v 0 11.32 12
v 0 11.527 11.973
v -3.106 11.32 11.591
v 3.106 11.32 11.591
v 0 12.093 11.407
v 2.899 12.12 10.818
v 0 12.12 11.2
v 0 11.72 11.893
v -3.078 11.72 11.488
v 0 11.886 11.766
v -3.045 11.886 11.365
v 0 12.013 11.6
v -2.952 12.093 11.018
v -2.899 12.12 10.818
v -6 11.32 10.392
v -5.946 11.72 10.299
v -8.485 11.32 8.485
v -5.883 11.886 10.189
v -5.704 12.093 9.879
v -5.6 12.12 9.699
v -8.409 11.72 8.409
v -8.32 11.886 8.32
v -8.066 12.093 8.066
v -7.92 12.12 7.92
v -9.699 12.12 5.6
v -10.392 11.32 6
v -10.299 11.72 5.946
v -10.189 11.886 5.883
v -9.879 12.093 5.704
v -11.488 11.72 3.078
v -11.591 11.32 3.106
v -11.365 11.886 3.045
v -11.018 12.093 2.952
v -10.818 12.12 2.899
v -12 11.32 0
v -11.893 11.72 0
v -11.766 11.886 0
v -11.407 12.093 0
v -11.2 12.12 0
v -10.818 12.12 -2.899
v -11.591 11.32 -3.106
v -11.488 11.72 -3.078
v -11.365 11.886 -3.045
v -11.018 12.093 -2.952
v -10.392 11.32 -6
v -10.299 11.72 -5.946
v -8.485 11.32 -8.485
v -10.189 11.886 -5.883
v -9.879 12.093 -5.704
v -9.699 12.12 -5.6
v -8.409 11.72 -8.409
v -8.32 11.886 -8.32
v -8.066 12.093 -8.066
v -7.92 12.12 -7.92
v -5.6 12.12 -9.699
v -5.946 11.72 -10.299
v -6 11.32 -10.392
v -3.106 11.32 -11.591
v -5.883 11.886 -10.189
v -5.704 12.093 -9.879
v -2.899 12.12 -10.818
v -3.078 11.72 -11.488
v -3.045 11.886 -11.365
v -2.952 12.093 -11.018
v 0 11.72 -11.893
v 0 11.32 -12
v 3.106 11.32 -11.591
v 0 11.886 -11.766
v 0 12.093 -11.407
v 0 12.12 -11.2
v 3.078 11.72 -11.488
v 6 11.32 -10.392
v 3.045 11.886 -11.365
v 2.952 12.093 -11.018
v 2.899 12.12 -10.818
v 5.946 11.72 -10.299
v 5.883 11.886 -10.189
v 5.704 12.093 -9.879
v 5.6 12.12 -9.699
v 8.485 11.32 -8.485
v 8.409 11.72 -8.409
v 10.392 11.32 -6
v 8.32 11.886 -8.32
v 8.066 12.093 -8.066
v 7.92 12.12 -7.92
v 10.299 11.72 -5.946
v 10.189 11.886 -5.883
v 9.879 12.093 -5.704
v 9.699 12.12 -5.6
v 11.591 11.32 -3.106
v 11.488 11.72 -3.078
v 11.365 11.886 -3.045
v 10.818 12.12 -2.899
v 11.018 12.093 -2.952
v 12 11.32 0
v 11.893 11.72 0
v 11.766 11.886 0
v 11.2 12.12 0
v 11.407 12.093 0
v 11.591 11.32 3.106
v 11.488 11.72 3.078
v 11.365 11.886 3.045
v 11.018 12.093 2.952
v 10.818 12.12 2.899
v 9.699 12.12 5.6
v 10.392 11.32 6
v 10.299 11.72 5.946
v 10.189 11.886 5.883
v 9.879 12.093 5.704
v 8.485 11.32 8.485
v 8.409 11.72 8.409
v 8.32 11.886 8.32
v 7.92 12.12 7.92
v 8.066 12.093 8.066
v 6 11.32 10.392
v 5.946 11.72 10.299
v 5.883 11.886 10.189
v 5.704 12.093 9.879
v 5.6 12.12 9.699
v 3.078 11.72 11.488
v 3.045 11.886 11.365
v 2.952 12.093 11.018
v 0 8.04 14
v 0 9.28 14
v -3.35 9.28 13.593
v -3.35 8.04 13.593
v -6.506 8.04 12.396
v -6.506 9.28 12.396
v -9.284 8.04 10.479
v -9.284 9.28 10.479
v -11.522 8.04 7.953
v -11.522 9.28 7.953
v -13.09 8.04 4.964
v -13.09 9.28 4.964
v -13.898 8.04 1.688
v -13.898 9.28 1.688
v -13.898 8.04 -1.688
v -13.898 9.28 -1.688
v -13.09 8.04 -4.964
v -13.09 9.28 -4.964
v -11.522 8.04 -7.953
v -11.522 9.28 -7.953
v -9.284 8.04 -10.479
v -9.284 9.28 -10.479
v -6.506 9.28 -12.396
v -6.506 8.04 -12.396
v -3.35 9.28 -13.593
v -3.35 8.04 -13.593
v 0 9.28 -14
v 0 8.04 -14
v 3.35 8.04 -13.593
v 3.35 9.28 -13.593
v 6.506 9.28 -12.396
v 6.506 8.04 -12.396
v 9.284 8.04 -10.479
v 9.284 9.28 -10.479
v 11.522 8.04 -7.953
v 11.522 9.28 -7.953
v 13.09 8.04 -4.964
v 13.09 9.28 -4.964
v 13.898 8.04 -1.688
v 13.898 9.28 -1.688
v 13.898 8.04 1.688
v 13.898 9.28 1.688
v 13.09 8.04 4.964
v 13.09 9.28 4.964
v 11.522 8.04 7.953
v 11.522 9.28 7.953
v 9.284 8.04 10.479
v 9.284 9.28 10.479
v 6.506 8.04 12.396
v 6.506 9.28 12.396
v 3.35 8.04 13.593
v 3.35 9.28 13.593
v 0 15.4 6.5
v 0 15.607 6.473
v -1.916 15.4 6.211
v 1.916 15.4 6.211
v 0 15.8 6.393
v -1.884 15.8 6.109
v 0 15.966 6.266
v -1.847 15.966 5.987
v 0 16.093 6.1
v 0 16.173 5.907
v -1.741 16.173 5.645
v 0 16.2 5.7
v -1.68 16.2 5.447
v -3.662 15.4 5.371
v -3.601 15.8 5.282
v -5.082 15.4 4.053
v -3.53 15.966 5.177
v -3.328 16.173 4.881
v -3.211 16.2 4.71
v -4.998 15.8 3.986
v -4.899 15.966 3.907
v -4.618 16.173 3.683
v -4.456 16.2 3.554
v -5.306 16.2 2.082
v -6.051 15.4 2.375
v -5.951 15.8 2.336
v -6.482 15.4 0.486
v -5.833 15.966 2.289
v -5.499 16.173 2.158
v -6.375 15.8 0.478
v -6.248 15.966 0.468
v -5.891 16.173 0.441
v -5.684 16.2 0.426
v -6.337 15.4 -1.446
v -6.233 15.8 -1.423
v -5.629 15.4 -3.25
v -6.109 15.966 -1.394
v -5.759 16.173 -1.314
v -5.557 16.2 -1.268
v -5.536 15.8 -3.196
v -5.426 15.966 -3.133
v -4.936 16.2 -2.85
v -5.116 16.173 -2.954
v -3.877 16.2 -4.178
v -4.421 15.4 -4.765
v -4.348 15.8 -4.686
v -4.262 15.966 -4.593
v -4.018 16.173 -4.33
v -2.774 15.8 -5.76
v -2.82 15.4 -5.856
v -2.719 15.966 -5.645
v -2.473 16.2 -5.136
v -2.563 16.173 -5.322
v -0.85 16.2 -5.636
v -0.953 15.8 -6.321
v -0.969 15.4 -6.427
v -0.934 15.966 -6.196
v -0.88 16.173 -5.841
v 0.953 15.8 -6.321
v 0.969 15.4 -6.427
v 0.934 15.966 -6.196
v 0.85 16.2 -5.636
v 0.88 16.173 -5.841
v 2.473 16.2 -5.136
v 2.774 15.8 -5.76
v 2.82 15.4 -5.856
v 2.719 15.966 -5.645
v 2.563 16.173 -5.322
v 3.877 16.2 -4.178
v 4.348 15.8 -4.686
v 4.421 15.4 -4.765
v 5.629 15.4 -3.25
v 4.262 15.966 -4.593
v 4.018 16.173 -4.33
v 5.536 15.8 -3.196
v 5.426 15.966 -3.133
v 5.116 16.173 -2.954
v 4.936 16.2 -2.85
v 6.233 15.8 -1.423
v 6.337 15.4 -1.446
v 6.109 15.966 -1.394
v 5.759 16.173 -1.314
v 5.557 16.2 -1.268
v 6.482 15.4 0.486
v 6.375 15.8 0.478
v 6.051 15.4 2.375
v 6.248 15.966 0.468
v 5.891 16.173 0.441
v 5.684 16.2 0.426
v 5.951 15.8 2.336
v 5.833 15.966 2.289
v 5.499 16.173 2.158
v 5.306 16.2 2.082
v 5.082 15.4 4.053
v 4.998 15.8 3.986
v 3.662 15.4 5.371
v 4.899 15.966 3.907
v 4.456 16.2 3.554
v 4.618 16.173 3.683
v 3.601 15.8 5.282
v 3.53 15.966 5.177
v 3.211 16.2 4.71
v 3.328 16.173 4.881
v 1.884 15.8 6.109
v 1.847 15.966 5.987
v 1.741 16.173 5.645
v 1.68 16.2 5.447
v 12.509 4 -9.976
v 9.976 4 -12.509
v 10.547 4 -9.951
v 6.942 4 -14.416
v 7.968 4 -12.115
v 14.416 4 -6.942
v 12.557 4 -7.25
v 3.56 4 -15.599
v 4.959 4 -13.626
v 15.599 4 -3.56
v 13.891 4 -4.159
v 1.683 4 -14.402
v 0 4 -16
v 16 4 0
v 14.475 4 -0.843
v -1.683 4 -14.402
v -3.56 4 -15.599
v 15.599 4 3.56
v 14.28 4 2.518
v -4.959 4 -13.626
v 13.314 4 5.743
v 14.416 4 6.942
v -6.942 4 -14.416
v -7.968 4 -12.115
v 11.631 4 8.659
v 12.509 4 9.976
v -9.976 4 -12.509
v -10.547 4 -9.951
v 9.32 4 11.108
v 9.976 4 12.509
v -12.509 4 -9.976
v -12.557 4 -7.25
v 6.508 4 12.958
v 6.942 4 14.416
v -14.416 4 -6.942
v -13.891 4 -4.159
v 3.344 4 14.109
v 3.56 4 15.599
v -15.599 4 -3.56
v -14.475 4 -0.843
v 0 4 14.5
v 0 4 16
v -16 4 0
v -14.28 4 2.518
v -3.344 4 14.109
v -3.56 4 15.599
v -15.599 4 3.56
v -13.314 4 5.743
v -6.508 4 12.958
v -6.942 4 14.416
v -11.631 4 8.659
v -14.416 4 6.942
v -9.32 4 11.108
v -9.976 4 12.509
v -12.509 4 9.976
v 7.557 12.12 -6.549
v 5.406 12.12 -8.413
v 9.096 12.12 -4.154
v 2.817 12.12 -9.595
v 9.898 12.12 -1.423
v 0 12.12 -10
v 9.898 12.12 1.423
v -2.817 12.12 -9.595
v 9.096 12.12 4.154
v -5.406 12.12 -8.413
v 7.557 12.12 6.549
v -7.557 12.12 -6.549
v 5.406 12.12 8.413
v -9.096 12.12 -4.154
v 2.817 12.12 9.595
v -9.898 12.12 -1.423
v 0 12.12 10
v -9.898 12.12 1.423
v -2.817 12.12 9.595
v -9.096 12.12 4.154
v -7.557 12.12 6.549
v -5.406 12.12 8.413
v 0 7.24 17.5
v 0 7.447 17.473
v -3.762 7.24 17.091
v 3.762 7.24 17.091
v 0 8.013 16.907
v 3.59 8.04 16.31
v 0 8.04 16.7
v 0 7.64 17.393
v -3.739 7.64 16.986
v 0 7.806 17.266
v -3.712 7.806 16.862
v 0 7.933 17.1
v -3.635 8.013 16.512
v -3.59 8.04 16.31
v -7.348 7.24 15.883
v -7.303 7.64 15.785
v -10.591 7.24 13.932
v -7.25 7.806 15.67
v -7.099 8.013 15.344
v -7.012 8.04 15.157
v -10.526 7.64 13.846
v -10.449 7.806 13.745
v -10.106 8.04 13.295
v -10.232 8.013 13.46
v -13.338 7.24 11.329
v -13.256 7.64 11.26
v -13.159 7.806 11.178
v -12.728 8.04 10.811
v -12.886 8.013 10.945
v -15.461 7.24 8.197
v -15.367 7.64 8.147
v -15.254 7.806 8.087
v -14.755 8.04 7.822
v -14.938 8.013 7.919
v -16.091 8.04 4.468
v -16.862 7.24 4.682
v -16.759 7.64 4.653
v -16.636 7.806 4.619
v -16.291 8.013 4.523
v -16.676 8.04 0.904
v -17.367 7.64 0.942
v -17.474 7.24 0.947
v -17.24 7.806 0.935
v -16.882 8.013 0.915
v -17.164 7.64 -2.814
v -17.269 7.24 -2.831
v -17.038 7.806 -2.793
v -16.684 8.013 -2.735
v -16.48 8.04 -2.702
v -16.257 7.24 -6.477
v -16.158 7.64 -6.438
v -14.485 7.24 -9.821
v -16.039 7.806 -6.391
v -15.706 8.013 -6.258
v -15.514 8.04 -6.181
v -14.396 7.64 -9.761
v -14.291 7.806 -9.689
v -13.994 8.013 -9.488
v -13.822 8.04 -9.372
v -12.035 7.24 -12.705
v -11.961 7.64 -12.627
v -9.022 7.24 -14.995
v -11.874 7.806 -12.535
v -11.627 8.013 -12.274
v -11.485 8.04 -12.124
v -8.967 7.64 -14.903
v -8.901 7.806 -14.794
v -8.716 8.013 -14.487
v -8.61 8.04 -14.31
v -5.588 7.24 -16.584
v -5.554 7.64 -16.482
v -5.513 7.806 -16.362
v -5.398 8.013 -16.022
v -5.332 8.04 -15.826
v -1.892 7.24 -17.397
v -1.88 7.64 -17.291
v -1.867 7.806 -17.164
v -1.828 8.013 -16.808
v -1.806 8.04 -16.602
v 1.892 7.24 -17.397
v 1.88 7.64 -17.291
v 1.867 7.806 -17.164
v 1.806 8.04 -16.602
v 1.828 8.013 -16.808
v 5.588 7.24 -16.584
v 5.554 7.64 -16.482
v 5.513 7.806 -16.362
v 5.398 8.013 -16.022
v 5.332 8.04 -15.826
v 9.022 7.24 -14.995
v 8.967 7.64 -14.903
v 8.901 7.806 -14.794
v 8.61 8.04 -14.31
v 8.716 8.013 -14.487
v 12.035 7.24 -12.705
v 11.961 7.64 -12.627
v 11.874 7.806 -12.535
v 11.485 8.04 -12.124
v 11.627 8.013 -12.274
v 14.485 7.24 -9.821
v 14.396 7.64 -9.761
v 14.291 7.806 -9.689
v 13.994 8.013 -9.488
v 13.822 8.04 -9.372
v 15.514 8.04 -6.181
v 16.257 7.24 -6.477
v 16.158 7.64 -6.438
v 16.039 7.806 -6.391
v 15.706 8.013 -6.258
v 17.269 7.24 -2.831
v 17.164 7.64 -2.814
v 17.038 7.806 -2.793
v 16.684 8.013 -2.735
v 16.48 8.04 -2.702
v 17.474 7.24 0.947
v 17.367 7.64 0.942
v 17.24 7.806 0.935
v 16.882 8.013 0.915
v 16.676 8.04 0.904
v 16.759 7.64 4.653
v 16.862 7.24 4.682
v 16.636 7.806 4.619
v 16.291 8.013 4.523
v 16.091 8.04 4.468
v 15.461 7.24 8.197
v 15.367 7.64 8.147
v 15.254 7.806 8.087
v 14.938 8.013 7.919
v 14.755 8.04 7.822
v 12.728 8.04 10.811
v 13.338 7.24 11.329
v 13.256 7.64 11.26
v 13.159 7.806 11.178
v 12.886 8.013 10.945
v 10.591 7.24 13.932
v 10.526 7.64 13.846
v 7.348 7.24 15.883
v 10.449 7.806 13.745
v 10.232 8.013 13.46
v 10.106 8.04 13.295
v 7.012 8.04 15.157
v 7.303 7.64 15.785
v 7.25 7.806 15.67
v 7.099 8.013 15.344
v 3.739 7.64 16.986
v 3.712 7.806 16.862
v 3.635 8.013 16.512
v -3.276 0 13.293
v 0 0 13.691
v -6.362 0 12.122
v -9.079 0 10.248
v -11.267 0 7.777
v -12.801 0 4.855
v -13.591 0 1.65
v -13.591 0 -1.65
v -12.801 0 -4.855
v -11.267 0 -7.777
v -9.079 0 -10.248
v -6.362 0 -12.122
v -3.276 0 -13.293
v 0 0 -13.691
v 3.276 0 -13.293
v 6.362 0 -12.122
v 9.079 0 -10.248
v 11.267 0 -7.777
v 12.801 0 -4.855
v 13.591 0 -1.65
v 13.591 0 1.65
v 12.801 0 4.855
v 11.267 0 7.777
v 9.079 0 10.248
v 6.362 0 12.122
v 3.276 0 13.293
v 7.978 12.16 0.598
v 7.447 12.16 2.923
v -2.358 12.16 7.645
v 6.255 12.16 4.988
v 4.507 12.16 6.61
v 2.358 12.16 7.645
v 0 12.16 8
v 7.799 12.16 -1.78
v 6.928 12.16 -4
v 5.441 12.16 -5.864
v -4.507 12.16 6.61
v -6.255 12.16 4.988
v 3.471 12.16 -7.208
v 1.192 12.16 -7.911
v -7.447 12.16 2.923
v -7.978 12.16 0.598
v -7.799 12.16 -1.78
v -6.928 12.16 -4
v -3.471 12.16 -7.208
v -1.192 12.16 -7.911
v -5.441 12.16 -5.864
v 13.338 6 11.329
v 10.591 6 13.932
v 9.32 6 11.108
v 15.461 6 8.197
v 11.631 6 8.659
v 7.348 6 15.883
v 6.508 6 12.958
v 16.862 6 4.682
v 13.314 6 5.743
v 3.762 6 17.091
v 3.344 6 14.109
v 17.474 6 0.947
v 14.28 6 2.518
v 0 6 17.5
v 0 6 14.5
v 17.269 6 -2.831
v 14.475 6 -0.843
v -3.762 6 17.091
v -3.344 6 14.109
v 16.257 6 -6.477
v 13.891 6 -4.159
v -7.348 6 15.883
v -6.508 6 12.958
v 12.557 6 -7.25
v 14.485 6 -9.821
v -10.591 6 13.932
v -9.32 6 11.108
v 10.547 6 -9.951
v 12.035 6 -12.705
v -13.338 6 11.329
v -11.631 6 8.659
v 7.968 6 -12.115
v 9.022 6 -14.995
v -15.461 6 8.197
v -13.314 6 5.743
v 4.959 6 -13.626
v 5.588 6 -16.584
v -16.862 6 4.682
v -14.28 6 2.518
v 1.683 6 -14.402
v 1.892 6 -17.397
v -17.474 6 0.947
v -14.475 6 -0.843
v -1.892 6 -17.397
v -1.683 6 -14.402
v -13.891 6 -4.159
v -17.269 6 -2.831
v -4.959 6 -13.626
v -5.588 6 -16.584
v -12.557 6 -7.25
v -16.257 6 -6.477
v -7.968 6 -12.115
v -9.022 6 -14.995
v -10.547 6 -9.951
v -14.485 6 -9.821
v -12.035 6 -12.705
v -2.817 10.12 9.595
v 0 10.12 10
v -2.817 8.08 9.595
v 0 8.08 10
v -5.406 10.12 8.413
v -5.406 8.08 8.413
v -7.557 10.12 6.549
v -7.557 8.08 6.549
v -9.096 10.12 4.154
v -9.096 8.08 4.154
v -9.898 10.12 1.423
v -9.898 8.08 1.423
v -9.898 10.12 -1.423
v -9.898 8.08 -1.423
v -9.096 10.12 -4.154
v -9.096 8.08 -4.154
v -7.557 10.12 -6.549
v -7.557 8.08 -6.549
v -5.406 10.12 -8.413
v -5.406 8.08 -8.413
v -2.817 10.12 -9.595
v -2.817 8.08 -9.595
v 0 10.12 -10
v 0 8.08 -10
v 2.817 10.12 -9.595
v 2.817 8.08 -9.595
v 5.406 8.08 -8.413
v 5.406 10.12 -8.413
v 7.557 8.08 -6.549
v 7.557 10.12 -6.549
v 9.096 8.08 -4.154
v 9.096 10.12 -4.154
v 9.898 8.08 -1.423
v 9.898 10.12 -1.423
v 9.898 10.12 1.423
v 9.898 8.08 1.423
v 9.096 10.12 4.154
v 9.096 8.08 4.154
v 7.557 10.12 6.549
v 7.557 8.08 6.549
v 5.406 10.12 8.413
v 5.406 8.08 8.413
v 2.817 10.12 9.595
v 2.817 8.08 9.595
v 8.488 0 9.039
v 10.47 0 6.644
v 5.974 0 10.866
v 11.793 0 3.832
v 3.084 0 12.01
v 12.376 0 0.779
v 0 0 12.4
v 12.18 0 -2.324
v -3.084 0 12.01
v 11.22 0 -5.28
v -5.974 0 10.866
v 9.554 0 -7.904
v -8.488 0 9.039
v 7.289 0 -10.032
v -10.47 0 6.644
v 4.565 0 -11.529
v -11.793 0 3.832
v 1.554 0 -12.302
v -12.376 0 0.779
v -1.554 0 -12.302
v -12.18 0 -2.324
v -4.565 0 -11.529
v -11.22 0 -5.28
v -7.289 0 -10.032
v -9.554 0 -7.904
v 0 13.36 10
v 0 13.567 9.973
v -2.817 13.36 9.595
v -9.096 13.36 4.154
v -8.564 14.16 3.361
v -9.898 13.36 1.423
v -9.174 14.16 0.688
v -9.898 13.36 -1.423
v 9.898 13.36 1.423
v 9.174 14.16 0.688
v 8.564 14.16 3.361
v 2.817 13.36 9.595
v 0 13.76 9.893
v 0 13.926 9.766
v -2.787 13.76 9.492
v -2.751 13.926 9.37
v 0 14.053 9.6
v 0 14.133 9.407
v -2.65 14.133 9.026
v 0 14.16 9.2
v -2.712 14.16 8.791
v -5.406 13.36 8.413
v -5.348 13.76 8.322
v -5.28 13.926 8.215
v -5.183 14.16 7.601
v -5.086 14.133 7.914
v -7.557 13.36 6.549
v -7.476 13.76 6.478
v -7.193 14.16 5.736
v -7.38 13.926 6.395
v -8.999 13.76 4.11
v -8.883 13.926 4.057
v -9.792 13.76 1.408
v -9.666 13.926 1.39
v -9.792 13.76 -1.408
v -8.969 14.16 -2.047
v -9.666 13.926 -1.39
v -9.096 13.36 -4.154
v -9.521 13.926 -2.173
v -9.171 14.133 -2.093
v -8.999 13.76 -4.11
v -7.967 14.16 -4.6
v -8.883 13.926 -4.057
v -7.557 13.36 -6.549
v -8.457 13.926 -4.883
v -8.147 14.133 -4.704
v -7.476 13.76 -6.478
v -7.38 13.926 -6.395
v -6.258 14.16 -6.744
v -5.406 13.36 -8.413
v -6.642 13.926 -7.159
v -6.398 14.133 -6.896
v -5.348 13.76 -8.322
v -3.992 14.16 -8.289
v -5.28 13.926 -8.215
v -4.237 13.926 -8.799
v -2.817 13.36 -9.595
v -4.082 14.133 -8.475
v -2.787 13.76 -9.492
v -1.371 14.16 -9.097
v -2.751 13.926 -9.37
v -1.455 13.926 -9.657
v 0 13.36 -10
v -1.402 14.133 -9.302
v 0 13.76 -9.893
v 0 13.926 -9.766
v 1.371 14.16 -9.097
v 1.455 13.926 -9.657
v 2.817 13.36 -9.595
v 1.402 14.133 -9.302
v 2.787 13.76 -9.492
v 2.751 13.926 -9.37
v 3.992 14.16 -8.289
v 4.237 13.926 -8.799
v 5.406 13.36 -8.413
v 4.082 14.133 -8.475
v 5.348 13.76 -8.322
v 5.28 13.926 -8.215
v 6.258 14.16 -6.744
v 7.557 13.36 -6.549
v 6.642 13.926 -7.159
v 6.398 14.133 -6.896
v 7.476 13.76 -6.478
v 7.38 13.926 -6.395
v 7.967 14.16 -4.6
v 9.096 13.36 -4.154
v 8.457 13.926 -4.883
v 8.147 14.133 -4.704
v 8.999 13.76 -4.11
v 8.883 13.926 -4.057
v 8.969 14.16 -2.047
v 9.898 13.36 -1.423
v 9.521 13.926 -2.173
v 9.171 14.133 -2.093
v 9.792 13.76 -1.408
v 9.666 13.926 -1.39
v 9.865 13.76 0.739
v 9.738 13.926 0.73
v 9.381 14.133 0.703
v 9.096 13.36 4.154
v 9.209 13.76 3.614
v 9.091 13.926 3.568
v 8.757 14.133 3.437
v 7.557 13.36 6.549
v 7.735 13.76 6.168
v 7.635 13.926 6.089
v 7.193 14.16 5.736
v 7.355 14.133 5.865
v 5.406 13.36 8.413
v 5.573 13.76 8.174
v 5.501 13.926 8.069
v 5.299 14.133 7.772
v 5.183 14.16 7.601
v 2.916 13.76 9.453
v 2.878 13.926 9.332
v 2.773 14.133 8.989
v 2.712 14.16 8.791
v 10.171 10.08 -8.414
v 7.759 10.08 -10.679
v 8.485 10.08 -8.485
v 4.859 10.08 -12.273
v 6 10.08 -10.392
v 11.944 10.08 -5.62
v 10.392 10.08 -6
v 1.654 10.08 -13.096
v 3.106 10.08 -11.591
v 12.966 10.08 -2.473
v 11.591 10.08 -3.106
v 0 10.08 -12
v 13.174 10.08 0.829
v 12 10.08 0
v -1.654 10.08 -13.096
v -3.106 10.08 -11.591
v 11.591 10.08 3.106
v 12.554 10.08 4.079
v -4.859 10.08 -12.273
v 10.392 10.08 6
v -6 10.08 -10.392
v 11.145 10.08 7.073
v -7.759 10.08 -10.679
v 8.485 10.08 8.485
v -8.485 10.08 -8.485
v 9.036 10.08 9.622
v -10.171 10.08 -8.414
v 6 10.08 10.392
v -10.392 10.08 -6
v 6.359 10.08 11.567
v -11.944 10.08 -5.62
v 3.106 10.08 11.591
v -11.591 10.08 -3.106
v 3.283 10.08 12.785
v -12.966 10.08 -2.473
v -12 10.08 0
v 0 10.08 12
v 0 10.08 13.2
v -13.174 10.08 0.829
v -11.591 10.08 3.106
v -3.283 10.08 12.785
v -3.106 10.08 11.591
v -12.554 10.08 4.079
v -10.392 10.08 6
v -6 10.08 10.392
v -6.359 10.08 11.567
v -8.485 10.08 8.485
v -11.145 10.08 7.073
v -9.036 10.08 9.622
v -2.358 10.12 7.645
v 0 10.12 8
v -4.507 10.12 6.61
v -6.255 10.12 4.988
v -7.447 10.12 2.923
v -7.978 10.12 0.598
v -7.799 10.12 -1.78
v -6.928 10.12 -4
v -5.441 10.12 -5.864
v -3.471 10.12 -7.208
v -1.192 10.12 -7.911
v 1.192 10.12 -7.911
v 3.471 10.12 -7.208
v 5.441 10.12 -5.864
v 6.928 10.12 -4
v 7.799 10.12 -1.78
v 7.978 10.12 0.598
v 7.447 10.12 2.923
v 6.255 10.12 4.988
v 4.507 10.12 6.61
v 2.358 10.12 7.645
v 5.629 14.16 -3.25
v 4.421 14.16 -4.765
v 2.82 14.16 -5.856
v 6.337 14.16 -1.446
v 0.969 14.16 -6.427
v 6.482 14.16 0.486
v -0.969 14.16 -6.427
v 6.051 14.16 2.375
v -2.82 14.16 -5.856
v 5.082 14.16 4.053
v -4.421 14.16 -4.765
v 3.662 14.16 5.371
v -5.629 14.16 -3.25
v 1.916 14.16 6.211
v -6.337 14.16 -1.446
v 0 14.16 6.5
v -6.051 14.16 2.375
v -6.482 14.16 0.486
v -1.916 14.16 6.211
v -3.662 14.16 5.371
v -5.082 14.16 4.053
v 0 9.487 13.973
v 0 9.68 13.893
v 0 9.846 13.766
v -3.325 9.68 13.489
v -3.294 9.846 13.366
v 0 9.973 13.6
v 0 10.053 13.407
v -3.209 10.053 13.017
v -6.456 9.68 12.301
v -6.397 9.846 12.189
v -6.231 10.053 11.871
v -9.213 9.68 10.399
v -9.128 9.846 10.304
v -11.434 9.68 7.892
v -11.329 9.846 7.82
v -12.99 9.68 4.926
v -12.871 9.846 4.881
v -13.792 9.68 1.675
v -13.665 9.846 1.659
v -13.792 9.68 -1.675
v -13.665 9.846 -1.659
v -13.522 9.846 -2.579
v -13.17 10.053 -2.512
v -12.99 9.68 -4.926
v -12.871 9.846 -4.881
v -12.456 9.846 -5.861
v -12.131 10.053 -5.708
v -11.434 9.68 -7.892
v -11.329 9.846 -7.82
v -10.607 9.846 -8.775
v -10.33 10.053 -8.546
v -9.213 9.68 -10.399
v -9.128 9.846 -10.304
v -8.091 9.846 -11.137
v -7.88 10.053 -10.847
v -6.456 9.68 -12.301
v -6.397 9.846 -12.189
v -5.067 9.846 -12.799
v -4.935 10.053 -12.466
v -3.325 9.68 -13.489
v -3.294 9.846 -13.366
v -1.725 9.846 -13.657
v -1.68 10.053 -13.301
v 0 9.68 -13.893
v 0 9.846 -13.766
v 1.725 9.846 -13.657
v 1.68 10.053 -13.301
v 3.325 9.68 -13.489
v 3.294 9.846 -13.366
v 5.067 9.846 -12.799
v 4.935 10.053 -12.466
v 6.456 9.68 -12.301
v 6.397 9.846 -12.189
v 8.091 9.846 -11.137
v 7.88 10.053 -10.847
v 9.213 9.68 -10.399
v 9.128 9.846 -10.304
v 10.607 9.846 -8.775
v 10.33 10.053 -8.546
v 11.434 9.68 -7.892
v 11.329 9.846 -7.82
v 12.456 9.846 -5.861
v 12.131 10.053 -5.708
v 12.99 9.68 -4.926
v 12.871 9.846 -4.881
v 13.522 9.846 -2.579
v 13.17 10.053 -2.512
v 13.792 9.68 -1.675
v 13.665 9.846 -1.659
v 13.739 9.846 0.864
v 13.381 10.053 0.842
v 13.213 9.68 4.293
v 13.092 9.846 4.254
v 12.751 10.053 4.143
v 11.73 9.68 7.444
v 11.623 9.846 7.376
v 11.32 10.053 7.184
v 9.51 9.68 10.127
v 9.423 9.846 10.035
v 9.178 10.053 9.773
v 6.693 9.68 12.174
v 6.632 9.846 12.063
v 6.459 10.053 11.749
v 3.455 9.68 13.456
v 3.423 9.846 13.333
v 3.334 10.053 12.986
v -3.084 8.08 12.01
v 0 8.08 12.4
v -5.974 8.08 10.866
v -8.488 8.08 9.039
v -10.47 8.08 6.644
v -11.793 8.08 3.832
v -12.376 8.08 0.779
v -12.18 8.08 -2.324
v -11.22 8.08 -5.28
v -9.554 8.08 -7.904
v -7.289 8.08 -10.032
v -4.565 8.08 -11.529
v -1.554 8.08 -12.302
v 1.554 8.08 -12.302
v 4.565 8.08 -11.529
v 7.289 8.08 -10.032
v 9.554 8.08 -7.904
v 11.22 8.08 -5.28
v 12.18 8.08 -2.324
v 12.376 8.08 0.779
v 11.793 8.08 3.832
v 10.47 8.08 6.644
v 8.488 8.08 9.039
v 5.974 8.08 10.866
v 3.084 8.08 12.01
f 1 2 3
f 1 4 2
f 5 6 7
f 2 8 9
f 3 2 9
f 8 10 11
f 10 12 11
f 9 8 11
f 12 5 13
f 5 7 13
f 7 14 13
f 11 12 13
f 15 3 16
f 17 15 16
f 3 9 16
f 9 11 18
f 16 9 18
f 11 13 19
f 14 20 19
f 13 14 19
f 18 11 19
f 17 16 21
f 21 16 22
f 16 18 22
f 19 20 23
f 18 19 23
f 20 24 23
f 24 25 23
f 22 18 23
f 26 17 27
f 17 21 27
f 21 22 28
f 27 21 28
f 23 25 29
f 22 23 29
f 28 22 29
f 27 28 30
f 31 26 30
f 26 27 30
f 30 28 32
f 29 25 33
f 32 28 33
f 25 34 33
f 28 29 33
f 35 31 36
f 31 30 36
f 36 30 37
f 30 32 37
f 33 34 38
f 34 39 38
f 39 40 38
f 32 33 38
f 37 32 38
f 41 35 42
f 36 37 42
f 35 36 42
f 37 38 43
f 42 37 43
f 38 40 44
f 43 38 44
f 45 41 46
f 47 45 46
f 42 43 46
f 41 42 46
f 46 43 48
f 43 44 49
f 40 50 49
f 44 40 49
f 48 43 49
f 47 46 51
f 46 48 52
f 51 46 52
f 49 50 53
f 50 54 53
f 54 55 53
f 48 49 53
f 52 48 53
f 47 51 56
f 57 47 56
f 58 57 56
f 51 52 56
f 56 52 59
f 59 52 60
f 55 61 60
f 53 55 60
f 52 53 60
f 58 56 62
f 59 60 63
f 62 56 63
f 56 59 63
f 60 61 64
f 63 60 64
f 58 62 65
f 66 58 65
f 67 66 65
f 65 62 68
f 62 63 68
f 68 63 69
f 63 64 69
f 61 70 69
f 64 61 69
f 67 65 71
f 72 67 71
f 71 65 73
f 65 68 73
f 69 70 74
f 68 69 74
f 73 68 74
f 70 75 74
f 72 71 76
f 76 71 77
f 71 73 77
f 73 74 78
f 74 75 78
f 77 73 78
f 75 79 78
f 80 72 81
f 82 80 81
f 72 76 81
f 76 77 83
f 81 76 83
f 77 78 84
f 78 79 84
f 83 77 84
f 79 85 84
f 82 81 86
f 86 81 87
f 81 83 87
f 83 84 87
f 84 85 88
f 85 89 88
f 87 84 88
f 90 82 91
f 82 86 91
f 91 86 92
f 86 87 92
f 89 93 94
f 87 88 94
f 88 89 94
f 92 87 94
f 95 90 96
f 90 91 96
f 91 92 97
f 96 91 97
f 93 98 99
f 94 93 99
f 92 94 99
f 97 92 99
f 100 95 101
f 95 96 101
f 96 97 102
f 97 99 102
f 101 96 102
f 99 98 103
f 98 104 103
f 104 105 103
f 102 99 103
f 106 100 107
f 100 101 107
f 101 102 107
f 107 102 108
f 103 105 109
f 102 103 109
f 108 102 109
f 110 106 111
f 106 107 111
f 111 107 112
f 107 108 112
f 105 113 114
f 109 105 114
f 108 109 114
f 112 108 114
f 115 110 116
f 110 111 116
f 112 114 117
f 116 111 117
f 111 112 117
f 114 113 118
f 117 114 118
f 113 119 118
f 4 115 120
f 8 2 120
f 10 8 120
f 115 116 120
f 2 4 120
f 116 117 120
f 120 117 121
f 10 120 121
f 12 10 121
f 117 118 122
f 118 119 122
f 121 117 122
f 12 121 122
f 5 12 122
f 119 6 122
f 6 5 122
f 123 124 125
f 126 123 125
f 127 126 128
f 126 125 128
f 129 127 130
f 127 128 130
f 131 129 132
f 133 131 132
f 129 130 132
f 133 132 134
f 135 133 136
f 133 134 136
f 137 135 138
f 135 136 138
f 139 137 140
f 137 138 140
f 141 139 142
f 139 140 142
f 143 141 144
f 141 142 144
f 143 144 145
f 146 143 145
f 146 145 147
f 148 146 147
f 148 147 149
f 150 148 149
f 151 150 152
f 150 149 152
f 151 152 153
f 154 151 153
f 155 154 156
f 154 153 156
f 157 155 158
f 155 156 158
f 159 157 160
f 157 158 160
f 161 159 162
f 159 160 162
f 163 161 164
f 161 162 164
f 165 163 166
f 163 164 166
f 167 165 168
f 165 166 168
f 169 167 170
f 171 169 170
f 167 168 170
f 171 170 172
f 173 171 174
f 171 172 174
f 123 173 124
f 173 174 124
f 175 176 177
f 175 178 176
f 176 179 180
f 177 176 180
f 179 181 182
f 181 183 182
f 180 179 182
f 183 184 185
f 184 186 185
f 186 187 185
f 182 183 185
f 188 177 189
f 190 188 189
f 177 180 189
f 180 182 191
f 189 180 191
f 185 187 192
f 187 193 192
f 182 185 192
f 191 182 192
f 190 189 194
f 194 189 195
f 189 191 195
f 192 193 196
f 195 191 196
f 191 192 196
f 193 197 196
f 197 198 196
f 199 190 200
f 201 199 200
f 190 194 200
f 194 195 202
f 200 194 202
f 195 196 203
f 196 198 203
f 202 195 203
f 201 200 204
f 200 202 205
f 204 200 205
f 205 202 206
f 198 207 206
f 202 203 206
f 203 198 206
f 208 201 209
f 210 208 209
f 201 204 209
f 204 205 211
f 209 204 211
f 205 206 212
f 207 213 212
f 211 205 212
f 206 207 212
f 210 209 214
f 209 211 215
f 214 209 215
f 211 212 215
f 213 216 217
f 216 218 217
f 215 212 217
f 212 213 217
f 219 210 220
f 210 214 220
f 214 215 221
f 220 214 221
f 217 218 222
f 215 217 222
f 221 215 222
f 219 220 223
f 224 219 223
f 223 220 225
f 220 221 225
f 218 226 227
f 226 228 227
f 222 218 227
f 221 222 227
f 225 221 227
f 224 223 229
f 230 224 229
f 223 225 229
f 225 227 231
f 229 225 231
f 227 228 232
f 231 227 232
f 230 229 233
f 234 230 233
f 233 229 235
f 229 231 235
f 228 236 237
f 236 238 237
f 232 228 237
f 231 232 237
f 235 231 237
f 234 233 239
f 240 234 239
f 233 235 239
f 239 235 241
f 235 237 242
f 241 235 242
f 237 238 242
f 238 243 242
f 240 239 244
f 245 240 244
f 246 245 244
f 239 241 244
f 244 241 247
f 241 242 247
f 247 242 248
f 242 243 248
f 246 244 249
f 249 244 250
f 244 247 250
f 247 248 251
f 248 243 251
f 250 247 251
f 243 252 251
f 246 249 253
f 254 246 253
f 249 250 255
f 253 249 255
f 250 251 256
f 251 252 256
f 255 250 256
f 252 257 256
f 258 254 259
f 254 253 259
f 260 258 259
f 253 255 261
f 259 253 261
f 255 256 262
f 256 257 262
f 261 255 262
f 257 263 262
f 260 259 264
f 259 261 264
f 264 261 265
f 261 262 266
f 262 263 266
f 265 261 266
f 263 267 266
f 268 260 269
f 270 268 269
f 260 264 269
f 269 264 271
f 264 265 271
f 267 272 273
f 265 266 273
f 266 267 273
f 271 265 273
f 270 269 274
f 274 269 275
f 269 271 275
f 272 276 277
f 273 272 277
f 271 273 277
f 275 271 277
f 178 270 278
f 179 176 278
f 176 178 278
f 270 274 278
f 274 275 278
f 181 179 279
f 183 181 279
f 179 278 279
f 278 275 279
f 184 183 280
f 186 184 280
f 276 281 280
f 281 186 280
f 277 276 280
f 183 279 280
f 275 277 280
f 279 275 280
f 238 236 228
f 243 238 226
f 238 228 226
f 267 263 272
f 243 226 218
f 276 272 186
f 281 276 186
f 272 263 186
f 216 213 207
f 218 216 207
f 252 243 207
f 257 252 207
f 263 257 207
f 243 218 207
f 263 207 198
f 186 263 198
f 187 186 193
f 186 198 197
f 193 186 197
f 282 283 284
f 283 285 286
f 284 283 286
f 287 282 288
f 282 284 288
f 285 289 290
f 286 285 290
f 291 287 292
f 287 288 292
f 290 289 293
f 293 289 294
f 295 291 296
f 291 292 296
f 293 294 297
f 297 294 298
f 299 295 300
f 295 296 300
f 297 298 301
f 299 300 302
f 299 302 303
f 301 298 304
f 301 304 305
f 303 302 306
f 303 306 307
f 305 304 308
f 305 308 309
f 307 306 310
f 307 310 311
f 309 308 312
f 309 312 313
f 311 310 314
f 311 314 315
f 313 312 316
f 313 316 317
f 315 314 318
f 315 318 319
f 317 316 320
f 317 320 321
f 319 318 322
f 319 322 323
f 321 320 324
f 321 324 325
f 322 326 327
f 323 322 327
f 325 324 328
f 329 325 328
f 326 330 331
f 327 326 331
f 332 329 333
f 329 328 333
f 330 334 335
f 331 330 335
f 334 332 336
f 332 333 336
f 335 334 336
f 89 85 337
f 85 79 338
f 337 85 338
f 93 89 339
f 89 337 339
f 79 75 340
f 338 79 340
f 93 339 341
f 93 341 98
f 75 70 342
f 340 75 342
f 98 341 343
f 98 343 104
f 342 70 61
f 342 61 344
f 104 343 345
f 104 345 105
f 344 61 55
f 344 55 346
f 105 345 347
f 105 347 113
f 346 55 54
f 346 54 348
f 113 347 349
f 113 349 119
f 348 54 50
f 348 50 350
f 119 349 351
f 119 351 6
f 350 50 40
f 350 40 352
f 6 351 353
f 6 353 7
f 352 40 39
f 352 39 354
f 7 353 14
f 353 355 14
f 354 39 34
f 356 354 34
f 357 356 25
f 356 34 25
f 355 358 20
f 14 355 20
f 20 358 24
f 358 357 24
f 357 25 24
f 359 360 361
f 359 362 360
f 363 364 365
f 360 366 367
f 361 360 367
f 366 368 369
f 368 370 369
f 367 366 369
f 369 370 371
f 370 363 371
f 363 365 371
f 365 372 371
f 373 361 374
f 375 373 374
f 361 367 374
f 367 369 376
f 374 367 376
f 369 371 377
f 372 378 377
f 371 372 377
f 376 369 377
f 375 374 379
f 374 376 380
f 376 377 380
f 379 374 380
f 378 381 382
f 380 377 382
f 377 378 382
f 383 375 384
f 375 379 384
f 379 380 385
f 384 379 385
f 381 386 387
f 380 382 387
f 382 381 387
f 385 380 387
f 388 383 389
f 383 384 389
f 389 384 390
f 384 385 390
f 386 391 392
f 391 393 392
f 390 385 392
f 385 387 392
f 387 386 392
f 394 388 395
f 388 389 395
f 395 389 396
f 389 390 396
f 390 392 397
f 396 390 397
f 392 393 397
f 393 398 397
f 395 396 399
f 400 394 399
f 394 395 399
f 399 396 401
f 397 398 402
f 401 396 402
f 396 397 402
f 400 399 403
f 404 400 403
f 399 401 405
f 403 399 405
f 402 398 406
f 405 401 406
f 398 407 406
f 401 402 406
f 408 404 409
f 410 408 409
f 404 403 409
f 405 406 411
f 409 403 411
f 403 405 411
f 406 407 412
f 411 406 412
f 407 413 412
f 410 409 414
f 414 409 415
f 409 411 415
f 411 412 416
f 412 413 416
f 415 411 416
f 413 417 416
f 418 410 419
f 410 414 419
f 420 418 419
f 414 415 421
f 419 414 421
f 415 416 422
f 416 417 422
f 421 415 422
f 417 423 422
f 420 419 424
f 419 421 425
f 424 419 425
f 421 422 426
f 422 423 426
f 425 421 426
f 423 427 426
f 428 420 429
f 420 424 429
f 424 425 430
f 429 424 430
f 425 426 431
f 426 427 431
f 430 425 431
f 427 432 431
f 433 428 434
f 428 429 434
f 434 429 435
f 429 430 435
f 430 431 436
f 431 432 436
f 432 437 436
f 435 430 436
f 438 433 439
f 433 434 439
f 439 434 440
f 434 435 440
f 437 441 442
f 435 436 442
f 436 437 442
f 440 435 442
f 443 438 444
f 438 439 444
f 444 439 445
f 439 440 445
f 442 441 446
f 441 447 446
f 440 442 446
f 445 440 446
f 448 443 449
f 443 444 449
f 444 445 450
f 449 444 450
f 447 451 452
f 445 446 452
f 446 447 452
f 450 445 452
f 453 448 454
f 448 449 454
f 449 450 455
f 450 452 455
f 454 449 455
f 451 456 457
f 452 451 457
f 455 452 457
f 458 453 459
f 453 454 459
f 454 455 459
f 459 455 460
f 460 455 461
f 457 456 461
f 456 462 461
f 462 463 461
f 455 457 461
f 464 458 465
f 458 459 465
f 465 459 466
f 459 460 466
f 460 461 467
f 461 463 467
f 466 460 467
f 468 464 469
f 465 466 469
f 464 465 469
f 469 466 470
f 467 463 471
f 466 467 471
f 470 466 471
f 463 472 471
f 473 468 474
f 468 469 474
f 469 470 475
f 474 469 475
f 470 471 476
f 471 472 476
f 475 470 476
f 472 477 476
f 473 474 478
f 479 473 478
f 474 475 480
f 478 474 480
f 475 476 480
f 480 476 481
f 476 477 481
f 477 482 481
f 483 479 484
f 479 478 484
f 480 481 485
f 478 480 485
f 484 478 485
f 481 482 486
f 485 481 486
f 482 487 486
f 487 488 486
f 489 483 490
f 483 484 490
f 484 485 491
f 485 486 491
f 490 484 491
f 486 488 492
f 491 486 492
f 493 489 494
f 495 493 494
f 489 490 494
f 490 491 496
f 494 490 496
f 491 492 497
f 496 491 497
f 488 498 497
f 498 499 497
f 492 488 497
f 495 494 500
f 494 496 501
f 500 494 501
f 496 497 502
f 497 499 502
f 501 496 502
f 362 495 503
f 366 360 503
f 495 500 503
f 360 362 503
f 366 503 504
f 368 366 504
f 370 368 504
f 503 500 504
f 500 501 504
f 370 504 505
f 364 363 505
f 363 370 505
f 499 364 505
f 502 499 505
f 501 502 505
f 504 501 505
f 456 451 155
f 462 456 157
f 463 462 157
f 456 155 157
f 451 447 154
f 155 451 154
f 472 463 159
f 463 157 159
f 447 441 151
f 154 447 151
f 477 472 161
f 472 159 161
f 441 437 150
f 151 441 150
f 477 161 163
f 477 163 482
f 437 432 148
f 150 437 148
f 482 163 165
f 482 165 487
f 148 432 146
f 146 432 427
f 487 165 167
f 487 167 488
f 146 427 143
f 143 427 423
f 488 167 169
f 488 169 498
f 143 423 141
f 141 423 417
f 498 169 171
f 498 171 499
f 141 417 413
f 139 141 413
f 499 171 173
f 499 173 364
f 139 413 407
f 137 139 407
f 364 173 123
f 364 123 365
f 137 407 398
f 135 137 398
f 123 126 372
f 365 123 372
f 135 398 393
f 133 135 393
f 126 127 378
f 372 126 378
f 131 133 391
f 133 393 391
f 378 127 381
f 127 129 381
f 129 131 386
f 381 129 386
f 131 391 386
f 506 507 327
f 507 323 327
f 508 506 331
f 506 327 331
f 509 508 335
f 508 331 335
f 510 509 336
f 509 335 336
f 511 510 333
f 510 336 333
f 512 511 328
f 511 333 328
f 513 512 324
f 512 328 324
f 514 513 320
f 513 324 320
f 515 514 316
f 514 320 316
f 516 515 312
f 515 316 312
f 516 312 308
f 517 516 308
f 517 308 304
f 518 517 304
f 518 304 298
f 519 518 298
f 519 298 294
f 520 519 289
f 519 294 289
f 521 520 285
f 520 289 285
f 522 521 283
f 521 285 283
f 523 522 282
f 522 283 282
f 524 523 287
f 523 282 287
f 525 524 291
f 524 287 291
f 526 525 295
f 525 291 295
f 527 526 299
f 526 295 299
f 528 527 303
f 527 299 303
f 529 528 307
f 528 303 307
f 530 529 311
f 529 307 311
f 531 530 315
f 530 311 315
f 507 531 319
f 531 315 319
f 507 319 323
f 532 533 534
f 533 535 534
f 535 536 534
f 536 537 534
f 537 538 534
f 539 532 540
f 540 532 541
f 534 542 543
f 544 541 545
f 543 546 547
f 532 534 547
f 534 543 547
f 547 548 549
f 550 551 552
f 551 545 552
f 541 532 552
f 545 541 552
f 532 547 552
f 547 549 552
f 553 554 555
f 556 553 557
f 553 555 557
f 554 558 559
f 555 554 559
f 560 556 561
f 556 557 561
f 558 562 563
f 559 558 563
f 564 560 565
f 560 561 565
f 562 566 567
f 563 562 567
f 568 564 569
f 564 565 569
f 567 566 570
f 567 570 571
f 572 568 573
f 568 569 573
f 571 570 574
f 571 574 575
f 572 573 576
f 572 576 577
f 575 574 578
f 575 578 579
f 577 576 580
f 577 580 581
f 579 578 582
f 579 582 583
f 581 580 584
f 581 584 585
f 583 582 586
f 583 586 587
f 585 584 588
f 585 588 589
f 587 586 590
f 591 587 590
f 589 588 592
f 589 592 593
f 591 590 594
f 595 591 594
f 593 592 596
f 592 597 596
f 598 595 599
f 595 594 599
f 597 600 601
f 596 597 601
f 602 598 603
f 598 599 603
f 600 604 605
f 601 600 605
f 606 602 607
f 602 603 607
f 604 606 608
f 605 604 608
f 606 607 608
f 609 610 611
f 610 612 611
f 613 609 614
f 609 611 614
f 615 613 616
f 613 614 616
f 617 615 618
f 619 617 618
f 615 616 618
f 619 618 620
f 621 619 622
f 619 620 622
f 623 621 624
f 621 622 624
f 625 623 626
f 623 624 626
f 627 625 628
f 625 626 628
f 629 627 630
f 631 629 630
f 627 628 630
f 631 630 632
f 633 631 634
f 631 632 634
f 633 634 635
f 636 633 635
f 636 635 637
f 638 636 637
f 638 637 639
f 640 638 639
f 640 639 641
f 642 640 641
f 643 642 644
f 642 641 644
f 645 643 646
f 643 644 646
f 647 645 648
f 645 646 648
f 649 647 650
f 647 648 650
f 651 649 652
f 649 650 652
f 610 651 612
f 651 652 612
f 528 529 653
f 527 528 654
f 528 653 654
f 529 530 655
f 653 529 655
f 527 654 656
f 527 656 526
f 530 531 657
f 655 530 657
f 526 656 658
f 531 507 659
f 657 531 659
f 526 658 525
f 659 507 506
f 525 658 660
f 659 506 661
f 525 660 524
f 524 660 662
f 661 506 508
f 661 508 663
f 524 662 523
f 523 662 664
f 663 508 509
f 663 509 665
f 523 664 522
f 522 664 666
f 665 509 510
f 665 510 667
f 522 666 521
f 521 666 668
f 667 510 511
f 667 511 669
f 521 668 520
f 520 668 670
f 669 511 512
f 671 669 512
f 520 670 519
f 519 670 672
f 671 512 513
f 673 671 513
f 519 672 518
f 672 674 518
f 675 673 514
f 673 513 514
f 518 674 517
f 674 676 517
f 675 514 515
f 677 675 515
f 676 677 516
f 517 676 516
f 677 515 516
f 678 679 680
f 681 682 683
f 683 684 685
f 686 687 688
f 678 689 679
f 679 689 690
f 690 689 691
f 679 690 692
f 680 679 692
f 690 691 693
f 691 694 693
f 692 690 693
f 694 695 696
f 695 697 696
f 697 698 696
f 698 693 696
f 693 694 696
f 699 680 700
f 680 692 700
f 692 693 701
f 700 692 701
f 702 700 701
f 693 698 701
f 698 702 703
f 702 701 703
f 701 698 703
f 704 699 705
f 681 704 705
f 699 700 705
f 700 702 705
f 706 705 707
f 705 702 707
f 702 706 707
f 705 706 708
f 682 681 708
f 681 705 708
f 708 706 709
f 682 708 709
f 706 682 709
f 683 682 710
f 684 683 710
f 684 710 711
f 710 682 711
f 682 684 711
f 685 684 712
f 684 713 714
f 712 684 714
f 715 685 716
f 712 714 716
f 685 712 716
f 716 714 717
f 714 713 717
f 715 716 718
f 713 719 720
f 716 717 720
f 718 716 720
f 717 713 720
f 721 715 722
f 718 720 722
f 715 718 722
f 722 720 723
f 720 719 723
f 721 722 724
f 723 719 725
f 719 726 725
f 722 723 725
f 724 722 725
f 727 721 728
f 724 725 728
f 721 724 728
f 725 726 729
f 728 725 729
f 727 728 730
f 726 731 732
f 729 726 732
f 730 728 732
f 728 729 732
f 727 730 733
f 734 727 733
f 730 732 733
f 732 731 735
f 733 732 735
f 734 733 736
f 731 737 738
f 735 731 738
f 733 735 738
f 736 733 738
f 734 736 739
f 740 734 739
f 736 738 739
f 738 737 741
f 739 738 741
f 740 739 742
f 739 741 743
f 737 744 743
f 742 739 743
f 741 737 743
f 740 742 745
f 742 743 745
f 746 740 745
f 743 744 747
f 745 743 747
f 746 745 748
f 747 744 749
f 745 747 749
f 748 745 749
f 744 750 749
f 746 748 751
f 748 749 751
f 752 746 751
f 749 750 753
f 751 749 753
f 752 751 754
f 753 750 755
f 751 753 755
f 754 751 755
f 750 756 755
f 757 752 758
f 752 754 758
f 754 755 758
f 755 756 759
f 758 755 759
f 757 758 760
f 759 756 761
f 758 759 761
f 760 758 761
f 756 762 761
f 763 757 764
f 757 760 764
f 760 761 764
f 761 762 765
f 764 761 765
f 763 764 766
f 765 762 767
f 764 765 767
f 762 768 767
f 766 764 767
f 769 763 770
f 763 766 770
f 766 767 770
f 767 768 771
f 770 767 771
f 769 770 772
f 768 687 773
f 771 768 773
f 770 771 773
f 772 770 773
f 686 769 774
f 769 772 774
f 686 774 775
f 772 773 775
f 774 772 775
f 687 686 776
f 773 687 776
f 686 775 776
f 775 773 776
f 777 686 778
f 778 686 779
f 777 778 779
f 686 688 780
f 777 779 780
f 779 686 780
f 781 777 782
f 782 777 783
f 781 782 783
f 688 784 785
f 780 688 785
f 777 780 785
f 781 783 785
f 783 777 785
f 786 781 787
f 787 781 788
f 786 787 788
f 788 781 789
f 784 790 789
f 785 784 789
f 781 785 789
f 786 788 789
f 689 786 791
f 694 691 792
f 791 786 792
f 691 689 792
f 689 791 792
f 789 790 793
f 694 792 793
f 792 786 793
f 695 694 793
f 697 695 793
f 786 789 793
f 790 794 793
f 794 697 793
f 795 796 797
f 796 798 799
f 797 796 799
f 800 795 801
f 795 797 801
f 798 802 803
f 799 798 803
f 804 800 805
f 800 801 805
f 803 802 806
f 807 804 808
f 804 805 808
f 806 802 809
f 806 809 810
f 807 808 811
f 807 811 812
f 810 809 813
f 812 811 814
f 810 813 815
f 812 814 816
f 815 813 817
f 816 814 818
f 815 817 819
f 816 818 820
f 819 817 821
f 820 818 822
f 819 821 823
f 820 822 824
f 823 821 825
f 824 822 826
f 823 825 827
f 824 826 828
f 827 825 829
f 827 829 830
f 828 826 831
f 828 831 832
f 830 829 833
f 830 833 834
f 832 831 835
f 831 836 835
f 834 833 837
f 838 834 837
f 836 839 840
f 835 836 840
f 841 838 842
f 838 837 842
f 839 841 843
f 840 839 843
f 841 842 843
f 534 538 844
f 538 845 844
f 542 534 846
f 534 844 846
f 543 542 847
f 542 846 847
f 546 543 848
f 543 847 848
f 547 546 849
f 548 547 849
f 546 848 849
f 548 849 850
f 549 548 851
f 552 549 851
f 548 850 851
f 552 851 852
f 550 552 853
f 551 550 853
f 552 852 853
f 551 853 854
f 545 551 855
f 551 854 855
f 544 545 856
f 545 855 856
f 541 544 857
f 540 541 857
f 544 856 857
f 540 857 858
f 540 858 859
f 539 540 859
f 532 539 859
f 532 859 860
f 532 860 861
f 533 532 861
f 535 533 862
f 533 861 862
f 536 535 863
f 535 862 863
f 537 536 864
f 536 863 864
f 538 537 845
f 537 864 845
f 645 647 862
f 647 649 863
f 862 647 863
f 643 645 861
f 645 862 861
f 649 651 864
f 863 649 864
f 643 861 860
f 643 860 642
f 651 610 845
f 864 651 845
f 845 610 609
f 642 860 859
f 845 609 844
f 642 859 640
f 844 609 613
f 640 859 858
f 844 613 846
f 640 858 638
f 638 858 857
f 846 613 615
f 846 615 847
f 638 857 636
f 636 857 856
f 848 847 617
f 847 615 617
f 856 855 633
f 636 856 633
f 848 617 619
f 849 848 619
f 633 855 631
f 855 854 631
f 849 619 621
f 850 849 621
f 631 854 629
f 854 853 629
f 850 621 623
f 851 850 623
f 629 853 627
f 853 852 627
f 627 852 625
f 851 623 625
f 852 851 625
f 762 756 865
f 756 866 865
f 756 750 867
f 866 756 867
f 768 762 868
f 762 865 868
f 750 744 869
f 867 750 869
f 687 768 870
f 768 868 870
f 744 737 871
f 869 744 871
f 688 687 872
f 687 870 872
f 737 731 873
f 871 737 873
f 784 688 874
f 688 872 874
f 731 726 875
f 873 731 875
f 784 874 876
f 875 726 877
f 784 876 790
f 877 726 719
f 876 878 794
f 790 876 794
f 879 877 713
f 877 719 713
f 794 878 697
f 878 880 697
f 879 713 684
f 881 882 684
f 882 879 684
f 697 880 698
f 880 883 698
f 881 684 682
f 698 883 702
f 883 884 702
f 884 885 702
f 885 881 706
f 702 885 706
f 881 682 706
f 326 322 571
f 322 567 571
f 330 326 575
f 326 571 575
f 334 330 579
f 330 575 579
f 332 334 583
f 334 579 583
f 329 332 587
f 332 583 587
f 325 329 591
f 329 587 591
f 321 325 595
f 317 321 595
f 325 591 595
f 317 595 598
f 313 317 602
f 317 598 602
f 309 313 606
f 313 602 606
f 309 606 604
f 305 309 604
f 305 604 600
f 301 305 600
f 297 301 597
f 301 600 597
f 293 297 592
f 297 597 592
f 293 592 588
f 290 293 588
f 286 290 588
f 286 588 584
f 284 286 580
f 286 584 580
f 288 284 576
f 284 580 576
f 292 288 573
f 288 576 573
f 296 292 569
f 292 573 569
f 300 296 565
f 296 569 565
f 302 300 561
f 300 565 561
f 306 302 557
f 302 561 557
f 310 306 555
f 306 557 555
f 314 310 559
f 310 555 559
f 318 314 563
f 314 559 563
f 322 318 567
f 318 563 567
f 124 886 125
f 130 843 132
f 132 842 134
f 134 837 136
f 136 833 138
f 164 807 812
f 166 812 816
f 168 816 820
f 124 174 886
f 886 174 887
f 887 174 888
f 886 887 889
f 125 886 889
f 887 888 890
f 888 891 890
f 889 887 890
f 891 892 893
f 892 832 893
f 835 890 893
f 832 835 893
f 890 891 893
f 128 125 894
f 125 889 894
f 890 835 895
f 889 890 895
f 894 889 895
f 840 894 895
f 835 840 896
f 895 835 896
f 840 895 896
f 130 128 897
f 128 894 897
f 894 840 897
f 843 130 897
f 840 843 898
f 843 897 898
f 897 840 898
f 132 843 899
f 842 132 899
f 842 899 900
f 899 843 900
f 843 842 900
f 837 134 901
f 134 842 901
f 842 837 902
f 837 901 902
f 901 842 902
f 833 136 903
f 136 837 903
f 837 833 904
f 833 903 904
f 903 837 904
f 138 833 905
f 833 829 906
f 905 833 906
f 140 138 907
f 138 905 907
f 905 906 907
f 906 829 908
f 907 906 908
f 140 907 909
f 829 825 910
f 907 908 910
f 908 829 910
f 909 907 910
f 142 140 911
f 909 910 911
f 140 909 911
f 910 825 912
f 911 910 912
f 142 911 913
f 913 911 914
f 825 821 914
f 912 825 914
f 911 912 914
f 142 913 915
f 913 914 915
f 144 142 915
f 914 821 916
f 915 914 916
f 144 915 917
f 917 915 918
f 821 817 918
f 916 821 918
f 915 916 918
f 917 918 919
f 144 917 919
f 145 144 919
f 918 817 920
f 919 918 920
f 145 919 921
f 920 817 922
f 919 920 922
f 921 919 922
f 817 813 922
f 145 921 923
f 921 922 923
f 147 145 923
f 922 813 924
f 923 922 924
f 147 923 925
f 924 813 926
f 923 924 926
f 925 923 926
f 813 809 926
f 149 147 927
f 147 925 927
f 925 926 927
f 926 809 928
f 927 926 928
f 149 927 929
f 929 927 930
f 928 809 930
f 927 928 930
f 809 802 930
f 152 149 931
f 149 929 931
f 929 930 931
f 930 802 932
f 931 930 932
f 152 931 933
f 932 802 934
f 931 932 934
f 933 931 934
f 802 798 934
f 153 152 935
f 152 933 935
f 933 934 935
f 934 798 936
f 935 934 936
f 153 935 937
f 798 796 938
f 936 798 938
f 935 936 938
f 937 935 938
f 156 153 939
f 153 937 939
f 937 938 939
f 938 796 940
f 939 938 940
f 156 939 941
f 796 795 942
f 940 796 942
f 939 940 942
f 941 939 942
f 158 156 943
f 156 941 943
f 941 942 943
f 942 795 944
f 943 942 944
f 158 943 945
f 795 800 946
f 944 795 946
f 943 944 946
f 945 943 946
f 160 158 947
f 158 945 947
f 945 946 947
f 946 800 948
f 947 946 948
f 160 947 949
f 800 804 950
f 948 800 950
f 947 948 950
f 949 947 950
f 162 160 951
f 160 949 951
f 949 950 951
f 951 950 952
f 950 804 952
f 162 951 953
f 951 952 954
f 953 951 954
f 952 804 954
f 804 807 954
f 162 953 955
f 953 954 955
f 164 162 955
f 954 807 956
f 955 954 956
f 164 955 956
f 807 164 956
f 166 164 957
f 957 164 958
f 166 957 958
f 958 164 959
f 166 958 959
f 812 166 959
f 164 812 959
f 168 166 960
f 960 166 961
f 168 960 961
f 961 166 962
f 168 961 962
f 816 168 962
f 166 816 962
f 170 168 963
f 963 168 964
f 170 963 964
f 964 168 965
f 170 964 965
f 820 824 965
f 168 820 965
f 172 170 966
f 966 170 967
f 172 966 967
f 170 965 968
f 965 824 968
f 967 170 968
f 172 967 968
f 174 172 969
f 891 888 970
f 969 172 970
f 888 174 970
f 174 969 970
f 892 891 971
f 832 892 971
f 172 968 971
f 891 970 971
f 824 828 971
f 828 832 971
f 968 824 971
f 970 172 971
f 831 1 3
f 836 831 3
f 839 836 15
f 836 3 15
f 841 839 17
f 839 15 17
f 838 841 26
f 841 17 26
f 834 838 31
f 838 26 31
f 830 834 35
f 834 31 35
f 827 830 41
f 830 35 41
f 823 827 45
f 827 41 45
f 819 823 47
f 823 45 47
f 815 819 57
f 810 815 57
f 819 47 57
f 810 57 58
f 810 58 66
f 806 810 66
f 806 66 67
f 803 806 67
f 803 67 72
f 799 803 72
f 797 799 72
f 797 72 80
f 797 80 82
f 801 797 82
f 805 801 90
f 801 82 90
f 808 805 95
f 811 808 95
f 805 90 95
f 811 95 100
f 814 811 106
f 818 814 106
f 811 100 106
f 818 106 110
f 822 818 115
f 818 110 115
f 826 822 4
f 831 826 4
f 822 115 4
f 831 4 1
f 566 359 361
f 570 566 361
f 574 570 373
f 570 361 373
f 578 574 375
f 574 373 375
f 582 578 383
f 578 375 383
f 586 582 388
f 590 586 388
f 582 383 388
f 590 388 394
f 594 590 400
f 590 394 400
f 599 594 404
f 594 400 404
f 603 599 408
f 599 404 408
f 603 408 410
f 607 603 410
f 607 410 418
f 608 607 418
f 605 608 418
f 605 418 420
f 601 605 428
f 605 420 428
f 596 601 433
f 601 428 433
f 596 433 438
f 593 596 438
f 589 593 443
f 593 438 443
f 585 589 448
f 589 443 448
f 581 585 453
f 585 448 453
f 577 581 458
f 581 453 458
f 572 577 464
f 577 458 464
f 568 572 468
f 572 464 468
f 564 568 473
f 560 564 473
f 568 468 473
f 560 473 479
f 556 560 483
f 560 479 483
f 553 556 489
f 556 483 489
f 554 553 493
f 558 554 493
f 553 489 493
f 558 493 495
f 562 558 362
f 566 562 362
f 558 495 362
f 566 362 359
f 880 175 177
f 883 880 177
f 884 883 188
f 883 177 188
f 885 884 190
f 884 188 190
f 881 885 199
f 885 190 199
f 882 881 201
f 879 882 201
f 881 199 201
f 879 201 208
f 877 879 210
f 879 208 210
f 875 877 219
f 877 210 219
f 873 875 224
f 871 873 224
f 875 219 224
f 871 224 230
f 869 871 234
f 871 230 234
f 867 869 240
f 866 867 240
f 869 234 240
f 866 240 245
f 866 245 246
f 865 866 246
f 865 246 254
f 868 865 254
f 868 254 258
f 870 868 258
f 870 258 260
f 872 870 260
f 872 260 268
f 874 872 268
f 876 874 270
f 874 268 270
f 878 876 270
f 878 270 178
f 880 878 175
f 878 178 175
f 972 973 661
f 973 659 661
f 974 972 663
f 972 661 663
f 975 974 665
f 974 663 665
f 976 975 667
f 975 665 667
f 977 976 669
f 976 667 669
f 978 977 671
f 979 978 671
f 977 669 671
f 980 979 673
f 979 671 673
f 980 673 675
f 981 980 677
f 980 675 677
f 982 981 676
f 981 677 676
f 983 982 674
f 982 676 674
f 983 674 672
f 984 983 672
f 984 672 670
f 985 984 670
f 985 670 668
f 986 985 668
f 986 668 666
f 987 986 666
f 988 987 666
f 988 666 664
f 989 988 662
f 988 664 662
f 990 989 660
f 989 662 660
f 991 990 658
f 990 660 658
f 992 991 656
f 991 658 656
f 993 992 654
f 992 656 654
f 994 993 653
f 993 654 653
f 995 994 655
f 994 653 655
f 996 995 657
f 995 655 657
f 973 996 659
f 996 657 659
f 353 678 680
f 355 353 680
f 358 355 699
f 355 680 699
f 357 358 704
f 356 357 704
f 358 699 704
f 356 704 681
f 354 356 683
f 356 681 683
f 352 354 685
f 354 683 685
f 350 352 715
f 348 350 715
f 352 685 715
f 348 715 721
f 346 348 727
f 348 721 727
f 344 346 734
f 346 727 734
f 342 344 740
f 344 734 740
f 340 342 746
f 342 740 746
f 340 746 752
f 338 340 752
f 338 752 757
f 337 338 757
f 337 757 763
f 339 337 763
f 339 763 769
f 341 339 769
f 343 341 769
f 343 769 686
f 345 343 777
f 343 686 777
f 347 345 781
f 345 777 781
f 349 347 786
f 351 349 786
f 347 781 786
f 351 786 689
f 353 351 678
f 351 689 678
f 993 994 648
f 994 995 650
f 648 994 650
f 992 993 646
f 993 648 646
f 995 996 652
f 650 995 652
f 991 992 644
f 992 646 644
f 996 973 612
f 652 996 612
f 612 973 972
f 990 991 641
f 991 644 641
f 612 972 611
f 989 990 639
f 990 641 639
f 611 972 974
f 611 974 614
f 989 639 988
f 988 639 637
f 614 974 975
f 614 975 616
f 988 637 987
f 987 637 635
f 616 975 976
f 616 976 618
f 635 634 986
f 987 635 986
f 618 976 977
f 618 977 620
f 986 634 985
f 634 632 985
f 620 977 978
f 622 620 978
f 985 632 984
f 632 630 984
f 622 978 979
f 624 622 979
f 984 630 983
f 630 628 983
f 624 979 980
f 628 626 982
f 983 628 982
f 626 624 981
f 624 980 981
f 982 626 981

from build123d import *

# Parameters (mm, degrees)
FILLET1_R = 0.8


with BuildPart() as part:
    # Sketch1 → Revolve1 (revolve)
    with BuildSketch(Plane.XY, mode=Mode.PRIVATE) as revolve1_sk:
        Polygon((12.4, 0), (13.690598923, 0), (16, 4), (14.5, 4), (14.5, 6), (17.5, 6), (17.5, 8.04), (14, 8.04), (14, 10.08), (12, 10.08), (12, 12.12), (10, 12.12), (10, 14.16), (6.5, 14.16), (6.5, 16.2), (0, 16.2), (0, 12.16), (8, 12.16), (8, 10.12), (10, 10.12), (10, 8.08), (12.4, 8.08), align=None)
    revolve(revolve1_sk.sketch.rotate(Axis((0, 67.946967249, 0), (0, -1, 0)), 90), axis=Axis((0, 67.946967249, 0), (0, -1, 0)))

    # Fillet1
    fillet1_edges = [part.edges().sort_by_distance(p)[0] for p in [
        (0, 8.04, -17.5),
        (0, 10.08, -14),
        (0, 12.12, -12),
        (0, 14.16, -10),
        (0, 16.2, -6.5),
    ]]
    fillet(fillet1_edges, radius=FILLET1_R)


solid = part.part
